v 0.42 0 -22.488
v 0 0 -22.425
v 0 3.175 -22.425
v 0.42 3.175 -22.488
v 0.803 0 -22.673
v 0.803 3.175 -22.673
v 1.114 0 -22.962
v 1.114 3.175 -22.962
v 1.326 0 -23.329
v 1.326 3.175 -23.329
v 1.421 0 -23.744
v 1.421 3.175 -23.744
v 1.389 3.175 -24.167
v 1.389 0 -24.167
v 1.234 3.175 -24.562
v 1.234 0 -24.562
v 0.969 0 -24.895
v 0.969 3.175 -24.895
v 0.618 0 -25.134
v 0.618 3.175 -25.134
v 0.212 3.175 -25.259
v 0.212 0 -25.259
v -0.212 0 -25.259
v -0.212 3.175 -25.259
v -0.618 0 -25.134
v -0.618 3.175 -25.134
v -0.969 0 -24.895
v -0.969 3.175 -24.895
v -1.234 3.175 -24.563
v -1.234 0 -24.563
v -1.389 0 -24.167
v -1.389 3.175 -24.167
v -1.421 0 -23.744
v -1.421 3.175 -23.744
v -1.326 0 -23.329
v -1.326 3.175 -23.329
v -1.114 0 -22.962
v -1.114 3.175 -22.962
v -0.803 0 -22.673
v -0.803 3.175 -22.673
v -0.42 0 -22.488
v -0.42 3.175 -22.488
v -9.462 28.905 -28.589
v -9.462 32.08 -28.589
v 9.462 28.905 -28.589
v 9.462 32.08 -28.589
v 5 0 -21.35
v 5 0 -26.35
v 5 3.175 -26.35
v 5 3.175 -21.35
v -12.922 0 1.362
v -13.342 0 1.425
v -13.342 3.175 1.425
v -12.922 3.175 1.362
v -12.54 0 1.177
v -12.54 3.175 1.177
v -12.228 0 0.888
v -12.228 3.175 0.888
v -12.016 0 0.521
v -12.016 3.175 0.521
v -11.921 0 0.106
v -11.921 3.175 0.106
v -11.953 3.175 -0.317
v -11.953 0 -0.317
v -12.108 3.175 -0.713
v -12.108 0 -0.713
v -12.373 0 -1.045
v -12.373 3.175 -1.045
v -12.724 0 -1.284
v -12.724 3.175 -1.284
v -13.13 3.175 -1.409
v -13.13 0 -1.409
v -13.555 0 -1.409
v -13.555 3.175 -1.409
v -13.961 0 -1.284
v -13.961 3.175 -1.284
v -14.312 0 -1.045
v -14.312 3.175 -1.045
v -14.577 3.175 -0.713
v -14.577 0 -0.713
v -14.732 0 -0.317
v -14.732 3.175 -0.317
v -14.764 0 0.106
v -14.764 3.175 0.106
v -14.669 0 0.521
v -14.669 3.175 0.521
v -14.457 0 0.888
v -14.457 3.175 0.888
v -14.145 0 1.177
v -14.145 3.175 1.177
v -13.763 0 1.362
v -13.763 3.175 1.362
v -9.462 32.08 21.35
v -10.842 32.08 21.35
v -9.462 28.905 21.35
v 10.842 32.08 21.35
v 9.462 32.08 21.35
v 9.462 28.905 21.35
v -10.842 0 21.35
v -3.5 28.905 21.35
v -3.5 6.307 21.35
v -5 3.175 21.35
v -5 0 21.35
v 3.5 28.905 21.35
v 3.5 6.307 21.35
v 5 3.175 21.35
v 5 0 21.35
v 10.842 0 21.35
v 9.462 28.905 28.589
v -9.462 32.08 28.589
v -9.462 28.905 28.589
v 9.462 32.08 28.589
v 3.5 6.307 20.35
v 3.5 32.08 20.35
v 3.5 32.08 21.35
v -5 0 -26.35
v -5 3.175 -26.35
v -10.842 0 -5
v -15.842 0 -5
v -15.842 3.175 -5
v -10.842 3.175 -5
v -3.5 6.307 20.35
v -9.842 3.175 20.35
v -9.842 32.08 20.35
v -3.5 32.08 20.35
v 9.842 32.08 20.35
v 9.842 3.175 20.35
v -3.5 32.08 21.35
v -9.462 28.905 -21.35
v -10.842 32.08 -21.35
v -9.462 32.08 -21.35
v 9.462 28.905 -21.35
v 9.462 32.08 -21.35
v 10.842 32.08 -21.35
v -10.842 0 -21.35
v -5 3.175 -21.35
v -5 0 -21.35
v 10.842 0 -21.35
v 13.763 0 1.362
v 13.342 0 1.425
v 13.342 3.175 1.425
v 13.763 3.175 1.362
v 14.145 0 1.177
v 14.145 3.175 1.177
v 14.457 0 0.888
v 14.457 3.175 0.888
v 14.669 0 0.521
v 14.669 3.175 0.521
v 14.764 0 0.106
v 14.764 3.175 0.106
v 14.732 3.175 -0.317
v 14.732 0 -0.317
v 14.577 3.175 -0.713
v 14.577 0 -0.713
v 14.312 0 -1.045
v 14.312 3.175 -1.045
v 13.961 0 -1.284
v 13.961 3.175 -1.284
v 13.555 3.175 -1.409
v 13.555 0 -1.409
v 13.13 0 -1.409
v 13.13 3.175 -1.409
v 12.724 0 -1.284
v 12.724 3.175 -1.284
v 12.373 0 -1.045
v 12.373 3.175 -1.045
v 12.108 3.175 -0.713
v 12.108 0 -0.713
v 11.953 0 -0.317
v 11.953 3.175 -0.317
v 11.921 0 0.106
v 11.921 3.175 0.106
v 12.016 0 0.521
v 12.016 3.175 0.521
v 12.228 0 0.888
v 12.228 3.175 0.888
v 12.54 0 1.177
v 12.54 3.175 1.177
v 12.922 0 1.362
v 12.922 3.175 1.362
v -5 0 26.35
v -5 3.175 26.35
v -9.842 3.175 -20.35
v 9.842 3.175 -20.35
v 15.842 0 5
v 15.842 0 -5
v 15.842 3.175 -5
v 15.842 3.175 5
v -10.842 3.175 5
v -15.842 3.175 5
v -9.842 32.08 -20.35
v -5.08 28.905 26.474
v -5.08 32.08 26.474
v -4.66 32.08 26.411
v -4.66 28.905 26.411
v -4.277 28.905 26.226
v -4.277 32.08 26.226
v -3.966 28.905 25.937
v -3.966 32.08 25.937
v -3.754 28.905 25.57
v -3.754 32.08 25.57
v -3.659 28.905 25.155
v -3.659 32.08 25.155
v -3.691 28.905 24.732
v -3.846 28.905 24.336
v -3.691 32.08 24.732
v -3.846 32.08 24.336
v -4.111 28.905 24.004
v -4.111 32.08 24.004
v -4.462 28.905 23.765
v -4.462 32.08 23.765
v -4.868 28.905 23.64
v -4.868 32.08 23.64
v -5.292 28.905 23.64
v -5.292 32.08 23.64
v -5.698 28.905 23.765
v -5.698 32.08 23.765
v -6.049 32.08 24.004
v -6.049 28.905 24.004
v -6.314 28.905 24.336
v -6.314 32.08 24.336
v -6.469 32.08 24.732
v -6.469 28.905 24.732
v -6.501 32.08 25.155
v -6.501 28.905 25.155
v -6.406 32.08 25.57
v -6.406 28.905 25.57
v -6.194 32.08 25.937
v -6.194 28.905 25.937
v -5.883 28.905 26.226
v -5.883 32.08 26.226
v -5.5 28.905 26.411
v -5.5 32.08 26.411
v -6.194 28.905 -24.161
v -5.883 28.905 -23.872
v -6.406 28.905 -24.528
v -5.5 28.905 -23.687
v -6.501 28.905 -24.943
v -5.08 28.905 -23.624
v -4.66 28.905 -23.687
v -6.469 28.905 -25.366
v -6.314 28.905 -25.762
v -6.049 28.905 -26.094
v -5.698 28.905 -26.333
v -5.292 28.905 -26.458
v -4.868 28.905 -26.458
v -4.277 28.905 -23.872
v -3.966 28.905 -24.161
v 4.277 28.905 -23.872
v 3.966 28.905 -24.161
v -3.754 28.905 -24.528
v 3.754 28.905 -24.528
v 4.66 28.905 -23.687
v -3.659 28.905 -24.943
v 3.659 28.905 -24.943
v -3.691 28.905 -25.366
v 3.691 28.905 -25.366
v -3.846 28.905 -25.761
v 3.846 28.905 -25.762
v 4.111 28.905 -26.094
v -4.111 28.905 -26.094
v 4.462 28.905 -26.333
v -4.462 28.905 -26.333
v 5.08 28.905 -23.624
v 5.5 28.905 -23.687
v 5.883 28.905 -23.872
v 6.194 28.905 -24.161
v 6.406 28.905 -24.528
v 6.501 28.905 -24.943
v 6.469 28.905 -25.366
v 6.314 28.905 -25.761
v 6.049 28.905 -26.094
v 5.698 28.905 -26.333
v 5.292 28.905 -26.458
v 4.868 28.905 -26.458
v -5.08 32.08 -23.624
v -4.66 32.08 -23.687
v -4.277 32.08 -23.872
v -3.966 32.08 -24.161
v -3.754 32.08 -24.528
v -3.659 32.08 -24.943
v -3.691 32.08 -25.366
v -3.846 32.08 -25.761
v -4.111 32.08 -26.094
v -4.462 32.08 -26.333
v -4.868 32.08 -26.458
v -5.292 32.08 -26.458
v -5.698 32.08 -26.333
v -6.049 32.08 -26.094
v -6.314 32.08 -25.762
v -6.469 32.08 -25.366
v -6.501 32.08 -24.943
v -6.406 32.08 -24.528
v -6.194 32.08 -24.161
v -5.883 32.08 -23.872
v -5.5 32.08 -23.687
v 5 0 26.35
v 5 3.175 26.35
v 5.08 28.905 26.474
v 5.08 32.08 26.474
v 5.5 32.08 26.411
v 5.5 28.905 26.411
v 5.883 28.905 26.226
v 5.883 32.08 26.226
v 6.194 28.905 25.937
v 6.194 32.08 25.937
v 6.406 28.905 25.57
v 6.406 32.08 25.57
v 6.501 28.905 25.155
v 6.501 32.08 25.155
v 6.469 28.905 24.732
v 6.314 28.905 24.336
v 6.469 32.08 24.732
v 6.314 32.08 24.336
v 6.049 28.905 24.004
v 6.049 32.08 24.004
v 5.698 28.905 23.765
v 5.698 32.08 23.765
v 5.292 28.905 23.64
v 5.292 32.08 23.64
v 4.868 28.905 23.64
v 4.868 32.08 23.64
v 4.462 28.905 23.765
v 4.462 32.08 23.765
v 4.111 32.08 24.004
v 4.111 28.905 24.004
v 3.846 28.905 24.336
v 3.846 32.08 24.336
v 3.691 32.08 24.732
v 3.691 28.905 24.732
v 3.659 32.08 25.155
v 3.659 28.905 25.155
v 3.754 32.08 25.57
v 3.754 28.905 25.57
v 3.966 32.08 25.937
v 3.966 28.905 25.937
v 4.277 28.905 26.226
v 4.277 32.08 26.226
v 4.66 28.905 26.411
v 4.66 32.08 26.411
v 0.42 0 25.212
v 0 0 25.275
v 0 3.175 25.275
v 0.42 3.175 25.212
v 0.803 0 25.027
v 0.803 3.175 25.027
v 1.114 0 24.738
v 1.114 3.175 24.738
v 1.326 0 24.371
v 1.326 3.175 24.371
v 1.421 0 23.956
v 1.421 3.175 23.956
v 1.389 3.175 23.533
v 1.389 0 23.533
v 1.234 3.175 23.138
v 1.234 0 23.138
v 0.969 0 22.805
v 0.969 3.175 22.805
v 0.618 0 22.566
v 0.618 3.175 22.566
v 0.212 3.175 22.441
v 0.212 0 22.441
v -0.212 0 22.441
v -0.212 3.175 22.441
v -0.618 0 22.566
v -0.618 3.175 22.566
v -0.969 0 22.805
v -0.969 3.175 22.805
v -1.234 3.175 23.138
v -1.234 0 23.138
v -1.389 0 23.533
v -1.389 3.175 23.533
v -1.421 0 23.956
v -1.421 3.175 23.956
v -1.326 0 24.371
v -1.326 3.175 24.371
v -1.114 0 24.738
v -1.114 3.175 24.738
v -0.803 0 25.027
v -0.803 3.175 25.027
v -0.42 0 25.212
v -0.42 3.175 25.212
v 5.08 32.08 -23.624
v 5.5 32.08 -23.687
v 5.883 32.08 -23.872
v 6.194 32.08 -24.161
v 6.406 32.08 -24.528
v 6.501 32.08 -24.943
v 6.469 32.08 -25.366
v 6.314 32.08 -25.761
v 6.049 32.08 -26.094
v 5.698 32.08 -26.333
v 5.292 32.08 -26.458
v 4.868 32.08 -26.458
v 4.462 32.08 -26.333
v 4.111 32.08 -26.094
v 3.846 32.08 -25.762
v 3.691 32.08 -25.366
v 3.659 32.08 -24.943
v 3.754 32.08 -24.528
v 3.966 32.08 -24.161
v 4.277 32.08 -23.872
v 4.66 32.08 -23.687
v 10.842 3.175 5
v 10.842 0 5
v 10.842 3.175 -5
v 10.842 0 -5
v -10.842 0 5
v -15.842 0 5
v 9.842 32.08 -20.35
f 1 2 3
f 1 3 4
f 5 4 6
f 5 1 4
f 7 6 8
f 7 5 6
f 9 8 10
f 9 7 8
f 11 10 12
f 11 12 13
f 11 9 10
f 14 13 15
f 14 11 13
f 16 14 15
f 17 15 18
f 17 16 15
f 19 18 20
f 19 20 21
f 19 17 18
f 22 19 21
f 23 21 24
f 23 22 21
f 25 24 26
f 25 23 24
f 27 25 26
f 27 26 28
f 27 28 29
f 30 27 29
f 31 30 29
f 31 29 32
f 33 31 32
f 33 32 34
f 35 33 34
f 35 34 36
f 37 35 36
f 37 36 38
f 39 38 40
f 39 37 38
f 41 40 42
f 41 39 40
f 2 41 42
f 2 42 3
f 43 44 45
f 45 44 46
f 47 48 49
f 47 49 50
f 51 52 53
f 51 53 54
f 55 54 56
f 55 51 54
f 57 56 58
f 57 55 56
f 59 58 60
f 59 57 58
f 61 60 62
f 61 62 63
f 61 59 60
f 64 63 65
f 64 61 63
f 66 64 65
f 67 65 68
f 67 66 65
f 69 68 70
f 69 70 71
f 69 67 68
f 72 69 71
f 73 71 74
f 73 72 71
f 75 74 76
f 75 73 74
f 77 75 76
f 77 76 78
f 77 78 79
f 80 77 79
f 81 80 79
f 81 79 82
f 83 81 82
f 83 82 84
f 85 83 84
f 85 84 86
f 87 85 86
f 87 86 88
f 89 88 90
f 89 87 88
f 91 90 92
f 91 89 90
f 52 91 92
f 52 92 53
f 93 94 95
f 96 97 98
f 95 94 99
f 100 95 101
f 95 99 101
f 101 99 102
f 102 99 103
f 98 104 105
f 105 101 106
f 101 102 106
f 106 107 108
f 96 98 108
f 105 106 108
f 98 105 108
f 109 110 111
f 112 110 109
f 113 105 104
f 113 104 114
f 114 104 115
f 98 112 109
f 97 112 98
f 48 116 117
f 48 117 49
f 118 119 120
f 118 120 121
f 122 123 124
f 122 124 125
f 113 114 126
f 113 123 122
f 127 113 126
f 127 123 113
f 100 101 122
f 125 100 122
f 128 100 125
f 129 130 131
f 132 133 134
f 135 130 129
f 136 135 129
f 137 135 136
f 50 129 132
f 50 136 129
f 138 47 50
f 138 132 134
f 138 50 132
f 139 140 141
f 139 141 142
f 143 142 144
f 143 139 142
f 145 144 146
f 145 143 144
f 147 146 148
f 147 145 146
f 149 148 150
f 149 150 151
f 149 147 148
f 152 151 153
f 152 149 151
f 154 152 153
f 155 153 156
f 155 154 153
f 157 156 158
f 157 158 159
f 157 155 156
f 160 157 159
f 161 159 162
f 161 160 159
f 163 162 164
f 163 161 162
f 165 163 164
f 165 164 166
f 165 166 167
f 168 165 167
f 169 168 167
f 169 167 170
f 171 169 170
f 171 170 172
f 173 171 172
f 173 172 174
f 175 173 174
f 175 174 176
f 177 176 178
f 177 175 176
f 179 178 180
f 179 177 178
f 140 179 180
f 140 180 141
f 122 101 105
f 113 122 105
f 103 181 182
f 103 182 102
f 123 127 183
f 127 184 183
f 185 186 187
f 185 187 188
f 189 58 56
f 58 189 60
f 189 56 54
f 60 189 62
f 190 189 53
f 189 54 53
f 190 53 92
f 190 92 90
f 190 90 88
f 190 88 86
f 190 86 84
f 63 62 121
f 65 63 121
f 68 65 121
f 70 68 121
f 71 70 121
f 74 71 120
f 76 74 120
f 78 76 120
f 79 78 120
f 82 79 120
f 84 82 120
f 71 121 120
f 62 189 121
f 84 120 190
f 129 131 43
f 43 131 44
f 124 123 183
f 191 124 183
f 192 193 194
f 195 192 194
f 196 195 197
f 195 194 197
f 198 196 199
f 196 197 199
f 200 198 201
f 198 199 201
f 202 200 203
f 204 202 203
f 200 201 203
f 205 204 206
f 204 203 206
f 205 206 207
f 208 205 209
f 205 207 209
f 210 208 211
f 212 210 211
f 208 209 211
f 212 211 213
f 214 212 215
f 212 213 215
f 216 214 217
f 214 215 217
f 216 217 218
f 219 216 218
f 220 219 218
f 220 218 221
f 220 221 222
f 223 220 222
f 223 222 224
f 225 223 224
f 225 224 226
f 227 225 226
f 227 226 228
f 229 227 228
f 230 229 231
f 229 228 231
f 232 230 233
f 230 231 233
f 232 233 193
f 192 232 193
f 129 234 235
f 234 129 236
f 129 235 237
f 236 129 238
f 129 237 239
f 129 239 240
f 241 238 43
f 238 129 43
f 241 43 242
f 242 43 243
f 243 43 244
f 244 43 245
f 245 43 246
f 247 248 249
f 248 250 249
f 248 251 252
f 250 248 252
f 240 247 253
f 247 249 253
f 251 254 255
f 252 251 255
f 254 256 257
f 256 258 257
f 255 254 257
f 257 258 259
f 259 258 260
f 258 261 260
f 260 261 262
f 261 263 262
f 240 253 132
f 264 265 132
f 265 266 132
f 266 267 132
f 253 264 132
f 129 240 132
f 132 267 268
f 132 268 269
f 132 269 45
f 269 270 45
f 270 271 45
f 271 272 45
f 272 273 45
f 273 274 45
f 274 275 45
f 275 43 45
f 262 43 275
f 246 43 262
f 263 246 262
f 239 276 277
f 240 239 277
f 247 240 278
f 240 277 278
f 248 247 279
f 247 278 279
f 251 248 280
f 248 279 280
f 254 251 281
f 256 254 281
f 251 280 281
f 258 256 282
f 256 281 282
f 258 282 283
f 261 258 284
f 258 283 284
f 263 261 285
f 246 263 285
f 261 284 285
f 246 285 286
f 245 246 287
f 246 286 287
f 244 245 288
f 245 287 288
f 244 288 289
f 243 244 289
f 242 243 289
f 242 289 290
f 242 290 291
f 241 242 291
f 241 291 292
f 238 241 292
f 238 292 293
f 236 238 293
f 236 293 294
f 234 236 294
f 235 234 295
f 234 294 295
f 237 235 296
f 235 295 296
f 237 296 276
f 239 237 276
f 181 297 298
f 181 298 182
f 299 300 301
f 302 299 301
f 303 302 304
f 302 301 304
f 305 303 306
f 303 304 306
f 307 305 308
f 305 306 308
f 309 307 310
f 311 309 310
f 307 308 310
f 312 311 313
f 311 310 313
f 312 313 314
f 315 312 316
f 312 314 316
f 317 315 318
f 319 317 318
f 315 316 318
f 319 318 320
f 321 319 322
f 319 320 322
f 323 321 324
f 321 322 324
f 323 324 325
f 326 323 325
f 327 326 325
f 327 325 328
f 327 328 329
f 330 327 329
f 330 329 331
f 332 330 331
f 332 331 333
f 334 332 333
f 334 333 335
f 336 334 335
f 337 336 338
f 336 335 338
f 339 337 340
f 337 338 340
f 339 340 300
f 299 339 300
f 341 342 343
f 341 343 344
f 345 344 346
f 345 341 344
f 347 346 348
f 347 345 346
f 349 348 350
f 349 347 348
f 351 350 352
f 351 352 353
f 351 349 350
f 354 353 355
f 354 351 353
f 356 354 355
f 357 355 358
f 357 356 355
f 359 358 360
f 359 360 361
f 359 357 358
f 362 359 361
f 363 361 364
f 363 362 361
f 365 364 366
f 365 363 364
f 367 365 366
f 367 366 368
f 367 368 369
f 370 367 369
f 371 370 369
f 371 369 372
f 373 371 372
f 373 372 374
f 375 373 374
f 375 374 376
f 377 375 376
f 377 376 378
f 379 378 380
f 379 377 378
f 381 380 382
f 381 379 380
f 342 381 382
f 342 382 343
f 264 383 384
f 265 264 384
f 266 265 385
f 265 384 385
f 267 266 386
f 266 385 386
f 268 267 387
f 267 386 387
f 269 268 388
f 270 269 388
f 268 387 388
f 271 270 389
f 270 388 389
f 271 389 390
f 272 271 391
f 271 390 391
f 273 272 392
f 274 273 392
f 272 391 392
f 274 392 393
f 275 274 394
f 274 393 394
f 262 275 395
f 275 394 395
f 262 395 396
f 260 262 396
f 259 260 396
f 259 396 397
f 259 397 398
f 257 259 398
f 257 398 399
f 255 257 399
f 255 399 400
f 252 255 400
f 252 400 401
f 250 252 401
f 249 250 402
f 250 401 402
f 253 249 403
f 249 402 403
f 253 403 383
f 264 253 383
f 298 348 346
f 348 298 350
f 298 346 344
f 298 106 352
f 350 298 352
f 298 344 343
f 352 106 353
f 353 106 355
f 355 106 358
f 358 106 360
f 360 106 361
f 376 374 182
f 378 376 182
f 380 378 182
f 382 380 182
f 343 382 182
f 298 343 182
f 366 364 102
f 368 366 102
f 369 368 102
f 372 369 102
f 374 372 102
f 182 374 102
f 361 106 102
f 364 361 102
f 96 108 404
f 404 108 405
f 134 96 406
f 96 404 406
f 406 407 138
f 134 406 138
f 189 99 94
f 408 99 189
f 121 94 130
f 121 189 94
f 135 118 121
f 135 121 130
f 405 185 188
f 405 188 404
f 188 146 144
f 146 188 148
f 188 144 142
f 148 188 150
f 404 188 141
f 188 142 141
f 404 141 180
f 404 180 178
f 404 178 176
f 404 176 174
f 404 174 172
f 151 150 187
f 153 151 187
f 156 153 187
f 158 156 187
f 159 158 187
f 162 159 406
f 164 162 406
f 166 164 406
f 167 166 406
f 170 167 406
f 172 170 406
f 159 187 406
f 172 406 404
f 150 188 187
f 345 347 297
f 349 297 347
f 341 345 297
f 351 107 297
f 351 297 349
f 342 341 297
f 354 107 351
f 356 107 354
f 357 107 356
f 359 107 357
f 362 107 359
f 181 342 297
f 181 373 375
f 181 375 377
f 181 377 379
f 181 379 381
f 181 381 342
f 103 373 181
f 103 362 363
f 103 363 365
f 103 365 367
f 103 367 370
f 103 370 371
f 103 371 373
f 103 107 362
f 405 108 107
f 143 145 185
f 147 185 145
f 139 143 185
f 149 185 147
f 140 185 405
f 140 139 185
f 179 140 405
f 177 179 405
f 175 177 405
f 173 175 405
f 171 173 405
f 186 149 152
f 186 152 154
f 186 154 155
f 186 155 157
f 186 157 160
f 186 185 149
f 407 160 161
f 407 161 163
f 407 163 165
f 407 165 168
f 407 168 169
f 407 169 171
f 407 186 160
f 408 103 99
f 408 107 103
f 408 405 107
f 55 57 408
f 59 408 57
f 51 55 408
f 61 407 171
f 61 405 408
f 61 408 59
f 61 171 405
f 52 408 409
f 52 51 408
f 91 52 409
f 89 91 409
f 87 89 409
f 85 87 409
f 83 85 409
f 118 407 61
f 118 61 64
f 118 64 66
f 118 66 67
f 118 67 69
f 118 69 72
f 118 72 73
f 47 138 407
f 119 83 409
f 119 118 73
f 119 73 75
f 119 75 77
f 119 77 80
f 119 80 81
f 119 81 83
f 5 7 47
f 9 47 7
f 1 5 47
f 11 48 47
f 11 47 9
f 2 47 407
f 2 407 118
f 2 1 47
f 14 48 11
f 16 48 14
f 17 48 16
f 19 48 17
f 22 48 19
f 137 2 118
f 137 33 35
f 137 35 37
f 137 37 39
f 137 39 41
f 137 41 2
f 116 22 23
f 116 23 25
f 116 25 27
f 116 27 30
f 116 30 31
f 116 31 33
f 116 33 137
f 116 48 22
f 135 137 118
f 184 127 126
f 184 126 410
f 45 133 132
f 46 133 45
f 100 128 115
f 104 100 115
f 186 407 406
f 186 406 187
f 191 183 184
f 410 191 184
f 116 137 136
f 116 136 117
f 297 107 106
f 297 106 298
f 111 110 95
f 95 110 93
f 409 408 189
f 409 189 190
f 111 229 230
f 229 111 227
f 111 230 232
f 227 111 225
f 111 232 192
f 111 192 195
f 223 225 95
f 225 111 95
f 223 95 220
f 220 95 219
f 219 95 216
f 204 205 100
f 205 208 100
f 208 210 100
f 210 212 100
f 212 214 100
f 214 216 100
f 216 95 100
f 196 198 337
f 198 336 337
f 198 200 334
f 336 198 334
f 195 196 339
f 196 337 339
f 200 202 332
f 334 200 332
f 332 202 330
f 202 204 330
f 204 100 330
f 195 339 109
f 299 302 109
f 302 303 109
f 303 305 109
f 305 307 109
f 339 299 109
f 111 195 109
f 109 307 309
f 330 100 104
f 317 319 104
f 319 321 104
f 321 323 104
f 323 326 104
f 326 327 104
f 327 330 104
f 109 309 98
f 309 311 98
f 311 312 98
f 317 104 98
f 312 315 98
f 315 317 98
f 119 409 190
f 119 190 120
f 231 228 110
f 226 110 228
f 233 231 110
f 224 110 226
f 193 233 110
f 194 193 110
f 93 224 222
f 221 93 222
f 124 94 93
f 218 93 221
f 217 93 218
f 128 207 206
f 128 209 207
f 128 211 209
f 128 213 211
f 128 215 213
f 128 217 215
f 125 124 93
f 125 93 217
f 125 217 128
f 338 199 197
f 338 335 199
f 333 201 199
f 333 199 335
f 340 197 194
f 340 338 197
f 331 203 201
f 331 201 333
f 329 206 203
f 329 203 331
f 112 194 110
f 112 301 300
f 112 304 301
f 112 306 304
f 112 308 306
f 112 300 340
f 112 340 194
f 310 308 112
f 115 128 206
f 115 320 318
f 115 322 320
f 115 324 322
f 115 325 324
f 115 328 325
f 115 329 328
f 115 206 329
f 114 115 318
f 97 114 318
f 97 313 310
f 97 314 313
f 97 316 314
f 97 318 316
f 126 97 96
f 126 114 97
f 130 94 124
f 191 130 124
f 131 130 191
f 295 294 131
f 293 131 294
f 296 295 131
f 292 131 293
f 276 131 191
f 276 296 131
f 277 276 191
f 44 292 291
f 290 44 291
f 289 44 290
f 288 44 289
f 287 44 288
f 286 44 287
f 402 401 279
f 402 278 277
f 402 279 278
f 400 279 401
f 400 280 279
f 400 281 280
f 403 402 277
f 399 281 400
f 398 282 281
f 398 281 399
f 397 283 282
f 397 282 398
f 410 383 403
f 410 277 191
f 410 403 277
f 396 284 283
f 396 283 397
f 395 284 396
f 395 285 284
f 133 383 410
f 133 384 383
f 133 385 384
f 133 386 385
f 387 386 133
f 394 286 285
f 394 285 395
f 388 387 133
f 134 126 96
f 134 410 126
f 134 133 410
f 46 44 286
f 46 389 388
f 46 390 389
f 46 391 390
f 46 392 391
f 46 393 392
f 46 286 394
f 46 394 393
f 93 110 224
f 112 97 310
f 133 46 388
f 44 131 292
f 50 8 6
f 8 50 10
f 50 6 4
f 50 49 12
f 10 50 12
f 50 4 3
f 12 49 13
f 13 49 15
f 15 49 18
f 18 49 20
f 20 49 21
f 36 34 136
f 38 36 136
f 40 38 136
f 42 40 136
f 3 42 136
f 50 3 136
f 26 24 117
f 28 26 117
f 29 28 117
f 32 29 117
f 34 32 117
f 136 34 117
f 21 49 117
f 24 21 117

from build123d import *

# Parameters (mm, degrees)
SKETCH1_R           = 1.425
BOSS_EXTRUDE1_DEPTH = 3.175
SKETCH2_W           = 21.685
SKETCH2_H           = 42.7
SKETCH2_W_2         = 19.685
SKETCH2_H_2         = 40.7
BOSS_EXTRUDE2_DEPTH = 28.905
SKETCH3_W           = 18.923
SKETCH3_H           = 7.239
SKETCH3_R           = 1.425
BOSS_EXTRUDE3_DEPTH = 3.175
SKETCH4_W           = 7
SKETCH4_H           = 25.77275476
CUT_EXTRUDE1_DEPTH  = 3.175


with BuildPart() as part:
    # Sketch1 → Boss-Extrude1 (new body)
    with BuildSketch(Plane(origin=(0, 0, 0), x_dir=(1, 0, 0), z_dir=(0, 1, 0))):
        Polygon((10.8425, -21.35), (5, -21.35), (5, -26.35), (-5, -26.35), (-5, -21.35), (-10.8425, -21.35), (-10.8425, -5), (-15.8425, -5), (-15.8425, 5), (-10.8425, 5), (-10.8425, 21.35), (-5, 21.35), (-5, 26.35), (5, 26.35), (5, 21.35), (10.8425, 21.35), (10.8425, 5), (15.8425, 5), (15.8425, -5), (10.8425, -5), align=None)
        with Locations(Location((0, 23.85, 0), (0, 0, 270))):
            Circle(SKETCH1_R, mode=Mode.SUBTRACT)
        with Locations(Location((-13.3425, 0, 0), (0, 0, 270))):
            Circle(SKETCH1_R, mode=Mode.SUBTRACT)
        with Locations(Location((13.3425, 0, 0), (0, 0, 270))):
            Circle(SKETCH1_R, mode=Mode.SUBTRACT)
        with Locations(Location((0, -23.85, 0), (0, 0, 270))):
            Circle(SKETCH1_R, mode=Mode.SUBTRACT)
    extrude(amount=BOSS_EXTRUDE1_DEPTH)

    # Sketch2 → Boss-Extrude2 (add)
    with BuildSketch(Plane(origin=(0, 3.175, 0), x_dir=(1, 0, 0), z_dir=(0, 1, 0))):
        Rectangle(SKETCH2_W, SKETCH2_H)
        Rectangle(SKETCH2_W_2, SKETCH2_H_2, mode=Mode.SUBTRACT)
    extrude(amount=BOSS_EXTRUDE2_DEPTH)

    # Sketch3 → Boss-Extrude3 (add)
    # profile 1 of 2: a face of its own
    with BuildSketch(Plane(origin=(0, 32.08, 0), x_dir=(1, 0, 0), z_dir=(0, 1, 0))):
        with Locations((0, 24.9695)):
            Rectangle(SKETCH3_W, SKETCH3_H)
        with Locations(Location((-5.08, 25.049, 0), (0, 0, 270))):
            Circle(SKETCH3_R, mode=Mode.SUBTRACT)
        with Locations(Location((5.08, 25.049, 0), (0, 0, 270))):
            Circle(SKETCH3_R, mode=Mode.SUBTRACT)
    # profile 2 of 2: a face of its own
    with BuildSketch(Plane(origin=(0, 32.08, 0), x_dir=(1, 0, 0), z_dir=(0, 1, 0))):
        with Locations((0, -24.9695)):
            Rectangle(SKETCH3_W, SKETCH3_H)
        with Locations(Location((-5.08, -25.049, 0), (0, 0, 270))):
            Circle(SKETCH3_R, mode=Mode.SUBTRACT)
        with Locations(Location((5.08, -25.049, 0), (0, 0, 270))):
            Circle(SKETCH3_R, mode=Mode.SUBTRACT)
    extrude(amount=-BOSS_EXTRUDE3_DEPTH)

    # Sketch4 → Cut-Extrude1 (cut)
    with BuildSketch(Plane.XY.offset(21.35)):
        with Locations((0, 19.19362262)):
            Rectangle(SKETCH4_W, SKETCH4_H)
    extrude(amount=-CUT_EXTRUDE1_DEPTH, mode=Mode.SUBTRACT)


solid = part.part
